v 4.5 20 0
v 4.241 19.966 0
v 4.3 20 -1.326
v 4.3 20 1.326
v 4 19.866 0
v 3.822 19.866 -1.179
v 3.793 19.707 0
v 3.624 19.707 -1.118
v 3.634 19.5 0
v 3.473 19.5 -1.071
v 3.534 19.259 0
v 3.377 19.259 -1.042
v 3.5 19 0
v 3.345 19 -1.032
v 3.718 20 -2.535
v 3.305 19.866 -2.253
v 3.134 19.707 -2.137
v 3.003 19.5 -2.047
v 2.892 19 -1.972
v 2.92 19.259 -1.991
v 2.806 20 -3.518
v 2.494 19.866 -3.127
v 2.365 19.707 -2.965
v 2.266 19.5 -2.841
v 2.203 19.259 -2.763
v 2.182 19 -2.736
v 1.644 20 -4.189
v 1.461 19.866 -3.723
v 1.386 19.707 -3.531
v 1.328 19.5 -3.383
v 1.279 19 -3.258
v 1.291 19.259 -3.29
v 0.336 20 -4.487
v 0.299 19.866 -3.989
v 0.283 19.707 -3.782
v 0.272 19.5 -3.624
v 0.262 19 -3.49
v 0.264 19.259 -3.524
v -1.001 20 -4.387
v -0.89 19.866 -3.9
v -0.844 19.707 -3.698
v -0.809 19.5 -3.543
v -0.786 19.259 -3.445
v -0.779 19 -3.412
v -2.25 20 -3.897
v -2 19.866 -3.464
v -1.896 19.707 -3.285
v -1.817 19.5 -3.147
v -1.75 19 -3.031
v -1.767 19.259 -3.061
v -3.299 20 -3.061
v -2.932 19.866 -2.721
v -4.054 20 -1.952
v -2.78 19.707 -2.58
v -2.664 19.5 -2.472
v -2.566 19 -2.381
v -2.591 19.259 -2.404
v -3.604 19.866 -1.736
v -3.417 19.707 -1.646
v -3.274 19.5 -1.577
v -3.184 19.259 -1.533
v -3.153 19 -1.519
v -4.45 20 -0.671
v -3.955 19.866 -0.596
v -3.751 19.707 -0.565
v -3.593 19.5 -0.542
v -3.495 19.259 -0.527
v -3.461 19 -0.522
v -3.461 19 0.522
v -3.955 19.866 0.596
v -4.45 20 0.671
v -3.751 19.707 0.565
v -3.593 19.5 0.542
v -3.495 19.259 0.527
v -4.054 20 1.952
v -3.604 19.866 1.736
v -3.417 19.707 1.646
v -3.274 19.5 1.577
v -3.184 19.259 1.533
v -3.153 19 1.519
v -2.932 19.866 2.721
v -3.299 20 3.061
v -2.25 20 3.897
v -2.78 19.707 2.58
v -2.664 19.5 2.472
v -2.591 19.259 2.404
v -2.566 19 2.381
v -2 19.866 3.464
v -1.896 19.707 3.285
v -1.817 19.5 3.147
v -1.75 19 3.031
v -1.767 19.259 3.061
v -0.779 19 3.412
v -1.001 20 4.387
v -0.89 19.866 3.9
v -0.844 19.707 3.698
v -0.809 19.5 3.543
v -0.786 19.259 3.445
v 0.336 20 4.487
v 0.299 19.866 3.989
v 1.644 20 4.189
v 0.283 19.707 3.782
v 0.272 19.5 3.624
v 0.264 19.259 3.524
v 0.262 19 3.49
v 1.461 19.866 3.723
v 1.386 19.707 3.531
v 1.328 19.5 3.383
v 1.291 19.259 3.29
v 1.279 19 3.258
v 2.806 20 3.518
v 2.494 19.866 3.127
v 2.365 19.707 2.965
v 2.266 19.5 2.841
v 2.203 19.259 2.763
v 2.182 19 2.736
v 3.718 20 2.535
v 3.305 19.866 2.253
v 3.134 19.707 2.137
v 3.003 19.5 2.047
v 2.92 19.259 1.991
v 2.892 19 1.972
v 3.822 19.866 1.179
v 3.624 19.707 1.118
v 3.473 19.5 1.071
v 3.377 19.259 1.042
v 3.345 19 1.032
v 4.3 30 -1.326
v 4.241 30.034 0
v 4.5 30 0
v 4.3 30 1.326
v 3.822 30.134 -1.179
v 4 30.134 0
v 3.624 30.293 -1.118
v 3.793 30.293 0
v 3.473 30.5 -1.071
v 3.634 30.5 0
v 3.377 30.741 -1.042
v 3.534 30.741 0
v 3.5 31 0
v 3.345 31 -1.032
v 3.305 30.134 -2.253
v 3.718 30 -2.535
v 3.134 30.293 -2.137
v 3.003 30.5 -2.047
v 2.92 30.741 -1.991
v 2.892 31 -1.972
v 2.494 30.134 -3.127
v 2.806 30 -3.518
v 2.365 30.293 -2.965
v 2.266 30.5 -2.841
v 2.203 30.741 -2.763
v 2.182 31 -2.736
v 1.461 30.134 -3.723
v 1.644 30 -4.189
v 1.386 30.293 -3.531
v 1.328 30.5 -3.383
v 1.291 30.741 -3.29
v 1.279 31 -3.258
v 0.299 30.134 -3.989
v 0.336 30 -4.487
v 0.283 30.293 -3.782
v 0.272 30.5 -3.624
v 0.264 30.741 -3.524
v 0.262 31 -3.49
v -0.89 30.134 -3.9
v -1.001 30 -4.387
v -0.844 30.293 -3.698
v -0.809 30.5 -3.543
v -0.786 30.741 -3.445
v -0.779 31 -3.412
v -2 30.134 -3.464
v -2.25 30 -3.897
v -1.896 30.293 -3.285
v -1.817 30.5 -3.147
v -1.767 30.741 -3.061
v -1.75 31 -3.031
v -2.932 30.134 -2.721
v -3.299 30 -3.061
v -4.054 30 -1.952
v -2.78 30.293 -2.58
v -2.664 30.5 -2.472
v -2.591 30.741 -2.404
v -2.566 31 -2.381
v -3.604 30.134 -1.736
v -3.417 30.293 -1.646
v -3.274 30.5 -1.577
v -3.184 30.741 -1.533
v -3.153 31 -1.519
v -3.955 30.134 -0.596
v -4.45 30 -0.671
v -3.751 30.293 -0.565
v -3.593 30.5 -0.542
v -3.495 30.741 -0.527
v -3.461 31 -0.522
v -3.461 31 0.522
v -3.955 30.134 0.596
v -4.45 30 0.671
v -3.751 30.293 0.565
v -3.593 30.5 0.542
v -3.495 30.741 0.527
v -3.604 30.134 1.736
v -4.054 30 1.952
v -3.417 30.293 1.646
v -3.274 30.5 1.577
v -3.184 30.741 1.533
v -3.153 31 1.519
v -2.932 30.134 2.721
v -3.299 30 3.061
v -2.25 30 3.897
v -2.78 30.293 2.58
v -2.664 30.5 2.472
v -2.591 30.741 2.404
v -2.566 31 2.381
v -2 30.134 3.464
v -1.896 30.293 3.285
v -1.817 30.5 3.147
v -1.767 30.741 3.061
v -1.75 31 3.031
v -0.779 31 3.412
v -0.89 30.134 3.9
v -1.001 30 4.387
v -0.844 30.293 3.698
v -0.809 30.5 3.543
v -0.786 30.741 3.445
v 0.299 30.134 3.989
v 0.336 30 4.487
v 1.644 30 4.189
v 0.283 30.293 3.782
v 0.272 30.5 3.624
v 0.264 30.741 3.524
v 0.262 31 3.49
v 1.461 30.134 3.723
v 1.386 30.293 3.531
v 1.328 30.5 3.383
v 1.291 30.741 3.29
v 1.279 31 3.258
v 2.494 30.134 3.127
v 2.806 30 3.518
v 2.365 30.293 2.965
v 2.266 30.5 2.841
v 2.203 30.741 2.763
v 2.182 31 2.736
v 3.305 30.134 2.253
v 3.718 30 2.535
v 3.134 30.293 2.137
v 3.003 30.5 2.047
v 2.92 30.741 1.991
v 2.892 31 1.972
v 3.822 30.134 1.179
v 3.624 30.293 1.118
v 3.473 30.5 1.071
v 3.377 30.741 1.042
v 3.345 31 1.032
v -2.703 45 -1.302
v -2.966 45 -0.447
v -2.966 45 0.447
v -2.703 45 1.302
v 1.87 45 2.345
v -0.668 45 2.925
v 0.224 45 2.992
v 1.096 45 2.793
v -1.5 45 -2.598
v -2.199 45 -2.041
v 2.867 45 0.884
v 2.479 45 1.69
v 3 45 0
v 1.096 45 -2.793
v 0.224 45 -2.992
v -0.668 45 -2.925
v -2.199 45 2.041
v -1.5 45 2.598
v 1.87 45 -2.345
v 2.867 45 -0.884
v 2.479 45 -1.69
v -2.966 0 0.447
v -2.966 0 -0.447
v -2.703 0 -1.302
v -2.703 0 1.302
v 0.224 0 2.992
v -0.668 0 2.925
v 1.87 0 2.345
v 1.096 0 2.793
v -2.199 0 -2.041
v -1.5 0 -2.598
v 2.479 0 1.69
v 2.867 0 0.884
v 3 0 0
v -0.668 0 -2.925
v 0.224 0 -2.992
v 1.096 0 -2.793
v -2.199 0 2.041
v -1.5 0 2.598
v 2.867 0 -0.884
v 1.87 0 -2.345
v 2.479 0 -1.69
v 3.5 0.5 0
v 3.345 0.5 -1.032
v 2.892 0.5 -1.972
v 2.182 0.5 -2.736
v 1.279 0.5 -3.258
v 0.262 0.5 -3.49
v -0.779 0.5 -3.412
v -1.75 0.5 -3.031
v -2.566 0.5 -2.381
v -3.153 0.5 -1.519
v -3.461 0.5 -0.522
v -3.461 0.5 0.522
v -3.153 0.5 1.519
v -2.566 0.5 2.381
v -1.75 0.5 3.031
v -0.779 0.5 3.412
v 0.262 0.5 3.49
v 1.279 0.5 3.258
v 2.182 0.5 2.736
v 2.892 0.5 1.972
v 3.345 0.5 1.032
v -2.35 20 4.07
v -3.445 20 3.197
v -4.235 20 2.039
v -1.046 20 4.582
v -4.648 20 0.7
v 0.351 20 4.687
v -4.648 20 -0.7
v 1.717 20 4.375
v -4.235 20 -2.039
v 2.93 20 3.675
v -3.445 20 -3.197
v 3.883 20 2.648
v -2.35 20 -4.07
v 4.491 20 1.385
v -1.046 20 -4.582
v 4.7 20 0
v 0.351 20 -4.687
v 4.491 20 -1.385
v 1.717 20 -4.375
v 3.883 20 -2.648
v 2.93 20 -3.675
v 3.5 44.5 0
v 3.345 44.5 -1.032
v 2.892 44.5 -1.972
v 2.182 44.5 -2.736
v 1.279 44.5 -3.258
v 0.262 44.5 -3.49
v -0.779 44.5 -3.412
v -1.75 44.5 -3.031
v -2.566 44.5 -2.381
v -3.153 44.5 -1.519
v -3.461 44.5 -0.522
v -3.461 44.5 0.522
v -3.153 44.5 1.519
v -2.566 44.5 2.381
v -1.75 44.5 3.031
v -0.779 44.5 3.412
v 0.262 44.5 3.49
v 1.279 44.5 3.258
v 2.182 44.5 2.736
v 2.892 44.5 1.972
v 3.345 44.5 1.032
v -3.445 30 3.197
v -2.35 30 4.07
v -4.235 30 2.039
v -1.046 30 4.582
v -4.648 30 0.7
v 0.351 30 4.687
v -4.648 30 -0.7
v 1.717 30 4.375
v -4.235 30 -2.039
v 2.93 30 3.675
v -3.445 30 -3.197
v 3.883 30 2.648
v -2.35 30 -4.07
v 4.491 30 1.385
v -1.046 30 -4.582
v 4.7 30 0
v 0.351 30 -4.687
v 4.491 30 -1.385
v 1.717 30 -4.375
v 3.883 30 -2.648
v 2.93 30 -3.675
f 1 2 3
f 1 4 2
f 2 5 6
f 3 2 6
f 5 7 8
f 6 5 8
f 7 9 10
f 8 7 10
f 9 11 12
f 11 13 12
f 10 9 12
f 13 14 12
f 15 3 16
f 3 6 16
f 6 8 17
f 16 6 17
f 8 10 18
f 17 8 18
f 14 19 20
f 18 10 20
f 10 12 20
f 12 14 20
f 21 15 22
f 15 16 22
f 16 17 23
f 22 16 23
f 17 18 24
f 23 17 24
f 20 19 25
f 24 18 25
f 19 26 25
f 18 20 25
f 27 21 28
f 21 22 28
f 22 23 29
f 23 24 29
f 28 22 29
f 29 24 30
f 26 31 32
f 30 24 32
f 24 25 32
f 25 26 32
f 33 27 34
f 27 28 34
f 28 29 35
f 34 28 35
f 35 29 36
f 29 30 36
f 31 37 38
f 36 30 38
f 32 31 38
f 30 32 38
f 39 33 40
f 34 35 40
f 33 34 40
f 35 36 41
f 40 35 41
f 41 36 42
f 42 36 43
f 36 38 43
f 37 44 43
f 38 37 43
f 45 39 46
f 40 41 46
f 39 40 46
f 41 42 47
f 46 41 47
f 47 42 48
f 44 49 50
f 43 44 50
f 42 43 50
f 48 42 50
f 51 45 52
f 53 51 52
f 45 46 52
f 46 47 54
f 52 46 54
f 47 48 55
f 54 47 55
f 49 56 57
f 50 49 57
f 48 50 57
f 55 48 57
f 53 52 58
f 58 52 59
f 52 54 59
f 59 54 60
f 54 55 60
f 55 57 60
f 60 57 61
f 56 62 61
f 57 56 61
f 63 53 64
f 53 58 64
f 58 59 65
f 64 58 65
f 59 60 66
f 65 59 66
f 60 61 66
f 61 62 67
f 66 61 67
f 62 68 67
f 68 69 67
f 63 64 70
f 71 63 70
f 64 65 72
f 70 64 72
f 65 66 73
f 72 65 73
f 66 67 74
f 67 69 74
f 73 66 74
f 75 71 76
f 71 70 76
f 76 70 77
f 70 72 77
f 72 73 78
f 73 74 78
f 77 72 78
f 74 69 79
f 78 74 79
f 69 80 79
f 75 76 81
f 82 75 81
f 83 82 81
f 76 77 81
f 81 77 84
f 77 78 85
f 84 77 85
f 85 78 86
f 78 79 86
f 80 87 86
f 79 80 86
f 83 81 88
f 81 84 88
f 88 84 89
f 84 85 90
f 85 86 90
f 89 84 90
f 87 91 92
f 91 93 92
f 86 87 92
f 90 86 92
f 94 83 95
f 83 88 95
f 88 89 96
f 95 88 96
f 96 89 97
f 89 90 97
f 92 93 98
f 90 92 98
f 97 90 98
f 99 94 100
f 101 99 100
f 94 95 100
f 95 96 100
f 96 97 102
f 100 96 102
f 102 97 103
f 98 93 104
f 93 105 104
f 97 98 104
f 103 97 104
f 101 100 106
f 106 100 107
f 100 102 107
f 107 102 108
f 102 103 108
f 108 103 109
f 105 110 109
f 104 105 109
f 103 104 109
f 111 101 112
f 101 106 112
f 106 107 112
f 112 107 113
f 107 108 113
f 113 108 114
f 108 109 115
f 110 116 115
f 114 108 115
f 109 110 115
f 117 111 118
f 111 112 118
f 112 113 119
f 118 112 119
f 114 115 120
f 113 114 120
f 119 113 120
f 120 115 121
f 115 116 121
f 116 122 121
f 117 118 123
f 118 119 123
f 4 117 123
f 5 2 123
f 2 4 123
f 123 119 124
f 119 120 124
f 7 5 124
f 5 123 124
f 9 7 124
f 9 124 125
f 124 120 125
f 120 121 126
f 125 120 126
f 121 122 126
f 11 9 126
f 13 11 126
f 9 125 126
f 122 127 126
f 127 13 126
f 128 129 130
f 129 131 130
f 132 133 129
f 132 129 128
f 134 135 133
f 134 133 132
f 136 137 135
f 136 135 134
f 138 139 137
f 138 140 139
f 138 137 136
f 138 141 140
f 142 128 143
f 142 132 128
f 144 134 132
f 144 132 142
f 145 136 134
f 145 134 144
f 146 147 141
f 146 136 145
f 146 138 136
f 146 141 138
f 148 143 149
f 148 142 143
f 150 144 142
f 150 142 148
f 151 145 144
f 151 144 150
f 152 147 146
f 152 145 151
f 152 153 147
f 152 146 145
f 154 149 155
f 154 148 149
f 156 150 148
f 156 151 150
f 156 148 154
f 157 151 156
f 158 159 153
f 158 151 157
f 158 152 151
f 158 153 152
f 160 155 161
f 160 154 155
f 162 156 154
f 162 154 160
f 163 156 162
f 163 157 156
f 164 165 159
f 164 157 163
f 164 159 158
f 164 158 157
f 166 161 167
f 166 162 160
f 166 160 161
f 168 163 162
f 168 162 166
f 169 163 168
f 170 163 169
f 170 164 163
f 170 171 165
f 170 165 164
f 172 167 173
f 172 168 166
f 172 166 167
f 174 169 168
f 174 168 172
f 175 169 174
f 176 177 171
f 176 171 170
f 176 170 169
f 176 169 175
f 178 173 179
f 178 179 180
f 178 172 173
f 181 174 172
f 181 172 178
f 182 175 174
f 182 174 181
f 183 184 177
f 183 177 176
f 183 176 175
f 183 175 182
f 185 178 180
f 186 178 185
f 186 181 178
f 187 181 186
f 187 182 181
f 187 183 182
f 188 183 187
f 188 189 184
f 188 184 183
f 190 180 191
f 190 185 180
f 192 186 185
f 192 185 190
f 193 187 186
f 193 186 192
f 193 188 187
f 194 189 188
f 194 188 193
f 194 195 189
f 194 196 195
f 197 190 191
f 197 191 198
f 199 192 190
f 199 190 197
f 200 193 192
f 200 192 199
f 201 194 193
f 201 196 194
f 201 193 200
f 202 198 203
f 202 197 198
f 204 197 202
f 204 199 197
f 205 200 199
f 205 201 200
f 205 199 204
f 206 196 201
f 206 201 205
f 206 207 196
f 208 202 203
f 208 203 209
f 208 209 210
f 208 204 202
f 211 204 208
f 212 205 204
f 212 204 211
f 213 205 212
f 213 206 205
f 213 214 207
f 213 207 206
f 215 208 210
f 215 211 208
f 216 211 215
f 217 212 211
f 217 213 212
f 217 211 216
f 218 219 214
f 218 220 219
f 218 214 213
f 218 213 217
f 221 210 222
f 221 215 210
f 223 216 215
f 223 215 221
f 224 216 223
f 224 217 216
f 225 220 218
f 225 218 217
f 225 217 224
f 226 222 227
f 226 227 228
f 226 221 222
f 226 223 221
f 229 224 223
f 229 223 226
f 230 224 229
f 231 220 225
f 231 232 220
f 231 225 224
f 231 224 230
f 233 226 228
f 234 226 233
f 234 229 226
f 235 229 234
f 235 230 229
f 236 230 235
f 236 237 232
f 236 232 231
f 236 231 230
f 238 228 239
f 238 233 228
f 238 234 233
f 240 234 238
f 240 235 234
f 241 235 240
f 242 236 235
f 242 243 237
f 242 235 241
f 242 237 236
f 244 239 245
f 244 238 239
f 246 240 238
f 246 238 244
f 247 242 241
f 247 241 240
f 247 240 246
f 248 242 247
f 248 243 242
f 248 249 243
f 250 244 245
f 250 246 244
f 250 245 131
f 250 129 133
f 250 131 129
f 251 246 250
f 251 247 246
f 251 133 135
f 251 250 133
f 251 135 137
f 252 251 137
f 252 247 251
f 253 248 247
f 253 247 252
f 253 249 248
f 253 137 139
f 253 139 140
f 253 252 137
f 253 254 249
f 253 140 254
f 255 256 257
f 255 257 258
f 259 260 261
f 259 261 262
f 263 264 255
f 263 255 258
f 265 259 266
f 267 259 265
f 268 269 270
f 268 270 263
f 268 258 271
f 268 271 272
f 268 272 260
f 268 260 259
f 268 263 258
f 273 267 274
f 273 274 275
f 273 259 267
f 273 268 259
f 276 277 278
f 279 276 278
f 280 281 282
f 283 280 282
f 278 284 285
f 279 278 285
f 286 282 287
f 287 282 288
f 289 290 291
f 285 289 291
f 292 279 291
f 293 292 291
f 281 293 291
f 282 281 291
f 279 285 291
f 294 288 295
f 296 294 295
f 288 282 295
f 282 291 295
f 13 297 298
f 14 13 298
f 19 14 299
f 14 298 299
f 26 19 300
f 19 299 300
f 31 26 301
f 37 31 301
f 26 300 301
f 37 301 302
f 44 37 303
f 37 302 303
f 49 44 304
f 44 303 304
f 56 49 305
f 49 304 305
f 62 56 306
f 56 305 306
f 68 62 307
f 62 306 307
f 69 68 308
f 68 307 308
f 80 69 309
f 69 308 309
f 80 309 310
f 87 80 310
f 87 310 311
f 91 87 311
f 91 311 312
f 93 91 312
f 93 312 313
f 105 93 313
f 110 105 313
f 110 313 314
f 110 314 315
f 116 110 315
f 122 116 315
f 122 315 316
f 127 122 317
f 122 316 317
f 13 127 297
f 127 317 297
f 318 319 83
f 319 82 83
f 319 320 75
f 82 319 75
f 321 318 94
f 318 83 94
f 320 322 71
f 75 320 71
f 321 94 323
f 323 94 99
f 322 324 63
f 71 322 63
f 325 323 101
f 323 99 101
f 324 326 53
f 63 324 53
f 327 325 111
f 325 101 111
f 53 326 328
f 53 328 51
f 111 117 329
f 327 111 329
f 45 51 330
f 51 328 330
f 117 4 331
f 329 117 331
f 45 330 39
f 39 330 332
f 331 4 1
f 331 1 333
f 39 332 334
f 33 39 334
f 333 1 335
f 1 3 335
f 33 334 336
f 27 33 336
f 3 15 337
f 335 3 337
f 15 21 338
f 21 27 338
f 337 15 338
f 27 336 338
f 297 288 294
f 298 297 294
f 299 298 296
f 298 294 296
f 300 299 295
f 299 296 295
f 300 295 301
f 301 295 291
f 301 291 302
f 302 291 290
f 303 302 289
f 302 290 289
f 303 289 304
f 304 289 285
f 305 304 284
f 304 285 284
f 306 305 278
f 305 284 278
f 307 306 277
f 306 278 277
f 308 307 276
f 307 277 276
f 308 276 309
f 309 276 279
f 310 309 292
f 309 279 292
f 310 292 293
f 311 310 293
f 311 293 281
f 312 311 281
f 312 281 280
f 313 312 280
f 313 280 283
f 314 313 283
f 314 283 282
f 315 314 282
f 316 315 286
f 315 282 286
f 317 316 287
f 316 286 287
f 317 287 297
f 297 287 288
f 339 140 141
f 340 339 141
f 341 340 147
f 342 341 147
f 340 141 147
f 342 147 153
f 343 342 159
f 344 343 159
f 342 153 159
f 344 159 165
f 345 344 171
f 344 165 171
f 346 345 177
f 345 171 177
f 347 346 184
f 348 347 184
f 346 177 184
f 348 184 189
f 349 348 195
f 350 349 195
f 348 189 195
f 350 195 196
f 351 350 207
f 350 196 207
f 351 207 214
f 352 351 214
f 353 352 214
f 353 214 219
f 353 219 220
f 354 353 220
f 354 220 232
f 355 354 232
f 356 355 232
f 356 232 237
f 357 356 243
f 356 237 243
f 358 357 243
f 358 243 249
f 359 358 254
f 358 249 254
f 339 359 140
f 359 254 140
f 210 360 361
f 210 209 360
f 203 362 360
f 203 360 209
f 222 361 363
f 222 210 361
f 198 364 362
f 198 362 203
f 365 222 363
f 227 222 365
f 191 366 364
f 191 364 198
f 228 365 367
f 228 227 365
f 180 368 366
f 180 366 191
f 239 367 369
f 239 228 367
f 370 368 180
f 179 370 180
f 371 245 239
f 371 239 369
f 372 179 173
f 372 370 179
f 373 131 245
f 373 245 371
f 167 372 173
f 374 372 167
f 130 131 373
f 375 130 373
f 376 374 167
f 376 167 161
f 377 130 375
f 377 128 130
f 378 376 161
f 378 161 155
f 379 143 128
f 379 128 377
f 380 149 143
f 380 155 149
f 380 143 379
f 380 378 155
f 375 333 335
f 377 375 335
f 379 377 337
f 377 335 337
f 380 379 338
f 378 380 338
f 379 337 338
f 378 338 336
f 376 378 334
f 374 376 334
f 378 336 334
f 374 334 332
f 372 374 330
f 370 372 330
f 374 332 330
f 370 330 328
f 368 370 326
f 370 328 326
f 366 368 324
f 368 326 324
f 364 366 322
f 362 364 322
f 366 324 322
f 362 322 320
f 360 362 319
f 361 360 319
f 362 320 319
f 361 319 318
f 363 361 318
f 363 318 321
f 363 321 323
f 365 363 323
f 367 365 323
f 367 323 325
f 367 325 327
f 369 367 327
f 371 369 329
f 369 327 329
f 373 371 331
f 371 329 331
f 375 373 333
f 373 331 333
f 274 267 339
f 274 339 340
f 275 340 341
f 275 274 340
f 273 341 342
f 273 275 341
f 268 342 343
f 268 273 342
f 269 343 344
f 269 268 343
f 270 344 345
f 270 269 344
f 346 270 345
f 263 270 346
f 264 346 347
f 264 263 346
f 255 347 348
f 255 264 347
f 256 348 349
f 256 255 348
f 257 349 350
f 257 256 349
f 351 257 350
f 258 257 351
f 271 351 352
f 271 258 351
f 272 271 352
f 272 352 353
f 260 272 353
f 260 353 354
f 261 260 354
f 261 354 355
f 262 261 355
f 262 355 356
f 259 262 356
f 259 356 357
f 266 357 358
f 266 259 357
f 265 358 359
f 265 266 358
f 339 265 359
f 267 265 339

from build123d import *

# Parameters (mm, degrees)
SKETCH1_R           = 3.5
BOSS_EXTRUDE1_DEPTH = 20
SKETCH2_R           = 4.7
BOSS_EXTRUDE2_DEPTH = 10
SKETCH3_R           = 3.5
BOSS_EXTRUDE3_DEPTH = 15
FILLET1_R           = 1
CHAMFER1_SIZE       = 0.5


with BuildPart() as part:
    # Sketch1 → Boss-Extrude1 (new body)
    with BuildSketch(Plane(origin=(0, 0, 0), x_dir=(1, 0, 0), z_dir=(0, 1, 0))):
        Circle(SKETCH1_R)
    extrude(amount=BOSS_EXTRUDE1_DEPTH)

    # Sketch2 → Boss-Extrude2 (add)
    with BuildSketch(Plane(origin=(0, 20, 0), x_dir=(1, 0, 0), z_dir=(0, 1, 0))):
        Circle(SKETCH2_R)
    extrude(amount=BOSS_EXTRUDE2_DEPTH)

    # Sketch3 → Boss-Extrude3 (add)
    with BuildSketch(Plane(origin=(0, 30, 0), x_dir=(1, 0, 0), z_dir=(0, 1, 0))):
        Circle(SKETCH3_R)
    extrude(amount=BOSS_EXTRUDE3_DEPTH)

    # Fillet1
    fillet1_edges = [part.edges().sort_by_distance(p)[0] for p in [
        (-3.5, 30, 0),
        (-3.5, 20, 0),
    ]]
    fillet(fillet1_edges, radius=FILLET1_R)

    # Chamfer1
    chamfer1_edges = [part.edges().sort_by_distance(p)[0] for p in [
        (-3.5, 45, 0),
        (-3.5, 0, 0),
    ]]
    chamfer(chamfer1_edges, length=CHAMFER1_SIZE)


solid = part.part
